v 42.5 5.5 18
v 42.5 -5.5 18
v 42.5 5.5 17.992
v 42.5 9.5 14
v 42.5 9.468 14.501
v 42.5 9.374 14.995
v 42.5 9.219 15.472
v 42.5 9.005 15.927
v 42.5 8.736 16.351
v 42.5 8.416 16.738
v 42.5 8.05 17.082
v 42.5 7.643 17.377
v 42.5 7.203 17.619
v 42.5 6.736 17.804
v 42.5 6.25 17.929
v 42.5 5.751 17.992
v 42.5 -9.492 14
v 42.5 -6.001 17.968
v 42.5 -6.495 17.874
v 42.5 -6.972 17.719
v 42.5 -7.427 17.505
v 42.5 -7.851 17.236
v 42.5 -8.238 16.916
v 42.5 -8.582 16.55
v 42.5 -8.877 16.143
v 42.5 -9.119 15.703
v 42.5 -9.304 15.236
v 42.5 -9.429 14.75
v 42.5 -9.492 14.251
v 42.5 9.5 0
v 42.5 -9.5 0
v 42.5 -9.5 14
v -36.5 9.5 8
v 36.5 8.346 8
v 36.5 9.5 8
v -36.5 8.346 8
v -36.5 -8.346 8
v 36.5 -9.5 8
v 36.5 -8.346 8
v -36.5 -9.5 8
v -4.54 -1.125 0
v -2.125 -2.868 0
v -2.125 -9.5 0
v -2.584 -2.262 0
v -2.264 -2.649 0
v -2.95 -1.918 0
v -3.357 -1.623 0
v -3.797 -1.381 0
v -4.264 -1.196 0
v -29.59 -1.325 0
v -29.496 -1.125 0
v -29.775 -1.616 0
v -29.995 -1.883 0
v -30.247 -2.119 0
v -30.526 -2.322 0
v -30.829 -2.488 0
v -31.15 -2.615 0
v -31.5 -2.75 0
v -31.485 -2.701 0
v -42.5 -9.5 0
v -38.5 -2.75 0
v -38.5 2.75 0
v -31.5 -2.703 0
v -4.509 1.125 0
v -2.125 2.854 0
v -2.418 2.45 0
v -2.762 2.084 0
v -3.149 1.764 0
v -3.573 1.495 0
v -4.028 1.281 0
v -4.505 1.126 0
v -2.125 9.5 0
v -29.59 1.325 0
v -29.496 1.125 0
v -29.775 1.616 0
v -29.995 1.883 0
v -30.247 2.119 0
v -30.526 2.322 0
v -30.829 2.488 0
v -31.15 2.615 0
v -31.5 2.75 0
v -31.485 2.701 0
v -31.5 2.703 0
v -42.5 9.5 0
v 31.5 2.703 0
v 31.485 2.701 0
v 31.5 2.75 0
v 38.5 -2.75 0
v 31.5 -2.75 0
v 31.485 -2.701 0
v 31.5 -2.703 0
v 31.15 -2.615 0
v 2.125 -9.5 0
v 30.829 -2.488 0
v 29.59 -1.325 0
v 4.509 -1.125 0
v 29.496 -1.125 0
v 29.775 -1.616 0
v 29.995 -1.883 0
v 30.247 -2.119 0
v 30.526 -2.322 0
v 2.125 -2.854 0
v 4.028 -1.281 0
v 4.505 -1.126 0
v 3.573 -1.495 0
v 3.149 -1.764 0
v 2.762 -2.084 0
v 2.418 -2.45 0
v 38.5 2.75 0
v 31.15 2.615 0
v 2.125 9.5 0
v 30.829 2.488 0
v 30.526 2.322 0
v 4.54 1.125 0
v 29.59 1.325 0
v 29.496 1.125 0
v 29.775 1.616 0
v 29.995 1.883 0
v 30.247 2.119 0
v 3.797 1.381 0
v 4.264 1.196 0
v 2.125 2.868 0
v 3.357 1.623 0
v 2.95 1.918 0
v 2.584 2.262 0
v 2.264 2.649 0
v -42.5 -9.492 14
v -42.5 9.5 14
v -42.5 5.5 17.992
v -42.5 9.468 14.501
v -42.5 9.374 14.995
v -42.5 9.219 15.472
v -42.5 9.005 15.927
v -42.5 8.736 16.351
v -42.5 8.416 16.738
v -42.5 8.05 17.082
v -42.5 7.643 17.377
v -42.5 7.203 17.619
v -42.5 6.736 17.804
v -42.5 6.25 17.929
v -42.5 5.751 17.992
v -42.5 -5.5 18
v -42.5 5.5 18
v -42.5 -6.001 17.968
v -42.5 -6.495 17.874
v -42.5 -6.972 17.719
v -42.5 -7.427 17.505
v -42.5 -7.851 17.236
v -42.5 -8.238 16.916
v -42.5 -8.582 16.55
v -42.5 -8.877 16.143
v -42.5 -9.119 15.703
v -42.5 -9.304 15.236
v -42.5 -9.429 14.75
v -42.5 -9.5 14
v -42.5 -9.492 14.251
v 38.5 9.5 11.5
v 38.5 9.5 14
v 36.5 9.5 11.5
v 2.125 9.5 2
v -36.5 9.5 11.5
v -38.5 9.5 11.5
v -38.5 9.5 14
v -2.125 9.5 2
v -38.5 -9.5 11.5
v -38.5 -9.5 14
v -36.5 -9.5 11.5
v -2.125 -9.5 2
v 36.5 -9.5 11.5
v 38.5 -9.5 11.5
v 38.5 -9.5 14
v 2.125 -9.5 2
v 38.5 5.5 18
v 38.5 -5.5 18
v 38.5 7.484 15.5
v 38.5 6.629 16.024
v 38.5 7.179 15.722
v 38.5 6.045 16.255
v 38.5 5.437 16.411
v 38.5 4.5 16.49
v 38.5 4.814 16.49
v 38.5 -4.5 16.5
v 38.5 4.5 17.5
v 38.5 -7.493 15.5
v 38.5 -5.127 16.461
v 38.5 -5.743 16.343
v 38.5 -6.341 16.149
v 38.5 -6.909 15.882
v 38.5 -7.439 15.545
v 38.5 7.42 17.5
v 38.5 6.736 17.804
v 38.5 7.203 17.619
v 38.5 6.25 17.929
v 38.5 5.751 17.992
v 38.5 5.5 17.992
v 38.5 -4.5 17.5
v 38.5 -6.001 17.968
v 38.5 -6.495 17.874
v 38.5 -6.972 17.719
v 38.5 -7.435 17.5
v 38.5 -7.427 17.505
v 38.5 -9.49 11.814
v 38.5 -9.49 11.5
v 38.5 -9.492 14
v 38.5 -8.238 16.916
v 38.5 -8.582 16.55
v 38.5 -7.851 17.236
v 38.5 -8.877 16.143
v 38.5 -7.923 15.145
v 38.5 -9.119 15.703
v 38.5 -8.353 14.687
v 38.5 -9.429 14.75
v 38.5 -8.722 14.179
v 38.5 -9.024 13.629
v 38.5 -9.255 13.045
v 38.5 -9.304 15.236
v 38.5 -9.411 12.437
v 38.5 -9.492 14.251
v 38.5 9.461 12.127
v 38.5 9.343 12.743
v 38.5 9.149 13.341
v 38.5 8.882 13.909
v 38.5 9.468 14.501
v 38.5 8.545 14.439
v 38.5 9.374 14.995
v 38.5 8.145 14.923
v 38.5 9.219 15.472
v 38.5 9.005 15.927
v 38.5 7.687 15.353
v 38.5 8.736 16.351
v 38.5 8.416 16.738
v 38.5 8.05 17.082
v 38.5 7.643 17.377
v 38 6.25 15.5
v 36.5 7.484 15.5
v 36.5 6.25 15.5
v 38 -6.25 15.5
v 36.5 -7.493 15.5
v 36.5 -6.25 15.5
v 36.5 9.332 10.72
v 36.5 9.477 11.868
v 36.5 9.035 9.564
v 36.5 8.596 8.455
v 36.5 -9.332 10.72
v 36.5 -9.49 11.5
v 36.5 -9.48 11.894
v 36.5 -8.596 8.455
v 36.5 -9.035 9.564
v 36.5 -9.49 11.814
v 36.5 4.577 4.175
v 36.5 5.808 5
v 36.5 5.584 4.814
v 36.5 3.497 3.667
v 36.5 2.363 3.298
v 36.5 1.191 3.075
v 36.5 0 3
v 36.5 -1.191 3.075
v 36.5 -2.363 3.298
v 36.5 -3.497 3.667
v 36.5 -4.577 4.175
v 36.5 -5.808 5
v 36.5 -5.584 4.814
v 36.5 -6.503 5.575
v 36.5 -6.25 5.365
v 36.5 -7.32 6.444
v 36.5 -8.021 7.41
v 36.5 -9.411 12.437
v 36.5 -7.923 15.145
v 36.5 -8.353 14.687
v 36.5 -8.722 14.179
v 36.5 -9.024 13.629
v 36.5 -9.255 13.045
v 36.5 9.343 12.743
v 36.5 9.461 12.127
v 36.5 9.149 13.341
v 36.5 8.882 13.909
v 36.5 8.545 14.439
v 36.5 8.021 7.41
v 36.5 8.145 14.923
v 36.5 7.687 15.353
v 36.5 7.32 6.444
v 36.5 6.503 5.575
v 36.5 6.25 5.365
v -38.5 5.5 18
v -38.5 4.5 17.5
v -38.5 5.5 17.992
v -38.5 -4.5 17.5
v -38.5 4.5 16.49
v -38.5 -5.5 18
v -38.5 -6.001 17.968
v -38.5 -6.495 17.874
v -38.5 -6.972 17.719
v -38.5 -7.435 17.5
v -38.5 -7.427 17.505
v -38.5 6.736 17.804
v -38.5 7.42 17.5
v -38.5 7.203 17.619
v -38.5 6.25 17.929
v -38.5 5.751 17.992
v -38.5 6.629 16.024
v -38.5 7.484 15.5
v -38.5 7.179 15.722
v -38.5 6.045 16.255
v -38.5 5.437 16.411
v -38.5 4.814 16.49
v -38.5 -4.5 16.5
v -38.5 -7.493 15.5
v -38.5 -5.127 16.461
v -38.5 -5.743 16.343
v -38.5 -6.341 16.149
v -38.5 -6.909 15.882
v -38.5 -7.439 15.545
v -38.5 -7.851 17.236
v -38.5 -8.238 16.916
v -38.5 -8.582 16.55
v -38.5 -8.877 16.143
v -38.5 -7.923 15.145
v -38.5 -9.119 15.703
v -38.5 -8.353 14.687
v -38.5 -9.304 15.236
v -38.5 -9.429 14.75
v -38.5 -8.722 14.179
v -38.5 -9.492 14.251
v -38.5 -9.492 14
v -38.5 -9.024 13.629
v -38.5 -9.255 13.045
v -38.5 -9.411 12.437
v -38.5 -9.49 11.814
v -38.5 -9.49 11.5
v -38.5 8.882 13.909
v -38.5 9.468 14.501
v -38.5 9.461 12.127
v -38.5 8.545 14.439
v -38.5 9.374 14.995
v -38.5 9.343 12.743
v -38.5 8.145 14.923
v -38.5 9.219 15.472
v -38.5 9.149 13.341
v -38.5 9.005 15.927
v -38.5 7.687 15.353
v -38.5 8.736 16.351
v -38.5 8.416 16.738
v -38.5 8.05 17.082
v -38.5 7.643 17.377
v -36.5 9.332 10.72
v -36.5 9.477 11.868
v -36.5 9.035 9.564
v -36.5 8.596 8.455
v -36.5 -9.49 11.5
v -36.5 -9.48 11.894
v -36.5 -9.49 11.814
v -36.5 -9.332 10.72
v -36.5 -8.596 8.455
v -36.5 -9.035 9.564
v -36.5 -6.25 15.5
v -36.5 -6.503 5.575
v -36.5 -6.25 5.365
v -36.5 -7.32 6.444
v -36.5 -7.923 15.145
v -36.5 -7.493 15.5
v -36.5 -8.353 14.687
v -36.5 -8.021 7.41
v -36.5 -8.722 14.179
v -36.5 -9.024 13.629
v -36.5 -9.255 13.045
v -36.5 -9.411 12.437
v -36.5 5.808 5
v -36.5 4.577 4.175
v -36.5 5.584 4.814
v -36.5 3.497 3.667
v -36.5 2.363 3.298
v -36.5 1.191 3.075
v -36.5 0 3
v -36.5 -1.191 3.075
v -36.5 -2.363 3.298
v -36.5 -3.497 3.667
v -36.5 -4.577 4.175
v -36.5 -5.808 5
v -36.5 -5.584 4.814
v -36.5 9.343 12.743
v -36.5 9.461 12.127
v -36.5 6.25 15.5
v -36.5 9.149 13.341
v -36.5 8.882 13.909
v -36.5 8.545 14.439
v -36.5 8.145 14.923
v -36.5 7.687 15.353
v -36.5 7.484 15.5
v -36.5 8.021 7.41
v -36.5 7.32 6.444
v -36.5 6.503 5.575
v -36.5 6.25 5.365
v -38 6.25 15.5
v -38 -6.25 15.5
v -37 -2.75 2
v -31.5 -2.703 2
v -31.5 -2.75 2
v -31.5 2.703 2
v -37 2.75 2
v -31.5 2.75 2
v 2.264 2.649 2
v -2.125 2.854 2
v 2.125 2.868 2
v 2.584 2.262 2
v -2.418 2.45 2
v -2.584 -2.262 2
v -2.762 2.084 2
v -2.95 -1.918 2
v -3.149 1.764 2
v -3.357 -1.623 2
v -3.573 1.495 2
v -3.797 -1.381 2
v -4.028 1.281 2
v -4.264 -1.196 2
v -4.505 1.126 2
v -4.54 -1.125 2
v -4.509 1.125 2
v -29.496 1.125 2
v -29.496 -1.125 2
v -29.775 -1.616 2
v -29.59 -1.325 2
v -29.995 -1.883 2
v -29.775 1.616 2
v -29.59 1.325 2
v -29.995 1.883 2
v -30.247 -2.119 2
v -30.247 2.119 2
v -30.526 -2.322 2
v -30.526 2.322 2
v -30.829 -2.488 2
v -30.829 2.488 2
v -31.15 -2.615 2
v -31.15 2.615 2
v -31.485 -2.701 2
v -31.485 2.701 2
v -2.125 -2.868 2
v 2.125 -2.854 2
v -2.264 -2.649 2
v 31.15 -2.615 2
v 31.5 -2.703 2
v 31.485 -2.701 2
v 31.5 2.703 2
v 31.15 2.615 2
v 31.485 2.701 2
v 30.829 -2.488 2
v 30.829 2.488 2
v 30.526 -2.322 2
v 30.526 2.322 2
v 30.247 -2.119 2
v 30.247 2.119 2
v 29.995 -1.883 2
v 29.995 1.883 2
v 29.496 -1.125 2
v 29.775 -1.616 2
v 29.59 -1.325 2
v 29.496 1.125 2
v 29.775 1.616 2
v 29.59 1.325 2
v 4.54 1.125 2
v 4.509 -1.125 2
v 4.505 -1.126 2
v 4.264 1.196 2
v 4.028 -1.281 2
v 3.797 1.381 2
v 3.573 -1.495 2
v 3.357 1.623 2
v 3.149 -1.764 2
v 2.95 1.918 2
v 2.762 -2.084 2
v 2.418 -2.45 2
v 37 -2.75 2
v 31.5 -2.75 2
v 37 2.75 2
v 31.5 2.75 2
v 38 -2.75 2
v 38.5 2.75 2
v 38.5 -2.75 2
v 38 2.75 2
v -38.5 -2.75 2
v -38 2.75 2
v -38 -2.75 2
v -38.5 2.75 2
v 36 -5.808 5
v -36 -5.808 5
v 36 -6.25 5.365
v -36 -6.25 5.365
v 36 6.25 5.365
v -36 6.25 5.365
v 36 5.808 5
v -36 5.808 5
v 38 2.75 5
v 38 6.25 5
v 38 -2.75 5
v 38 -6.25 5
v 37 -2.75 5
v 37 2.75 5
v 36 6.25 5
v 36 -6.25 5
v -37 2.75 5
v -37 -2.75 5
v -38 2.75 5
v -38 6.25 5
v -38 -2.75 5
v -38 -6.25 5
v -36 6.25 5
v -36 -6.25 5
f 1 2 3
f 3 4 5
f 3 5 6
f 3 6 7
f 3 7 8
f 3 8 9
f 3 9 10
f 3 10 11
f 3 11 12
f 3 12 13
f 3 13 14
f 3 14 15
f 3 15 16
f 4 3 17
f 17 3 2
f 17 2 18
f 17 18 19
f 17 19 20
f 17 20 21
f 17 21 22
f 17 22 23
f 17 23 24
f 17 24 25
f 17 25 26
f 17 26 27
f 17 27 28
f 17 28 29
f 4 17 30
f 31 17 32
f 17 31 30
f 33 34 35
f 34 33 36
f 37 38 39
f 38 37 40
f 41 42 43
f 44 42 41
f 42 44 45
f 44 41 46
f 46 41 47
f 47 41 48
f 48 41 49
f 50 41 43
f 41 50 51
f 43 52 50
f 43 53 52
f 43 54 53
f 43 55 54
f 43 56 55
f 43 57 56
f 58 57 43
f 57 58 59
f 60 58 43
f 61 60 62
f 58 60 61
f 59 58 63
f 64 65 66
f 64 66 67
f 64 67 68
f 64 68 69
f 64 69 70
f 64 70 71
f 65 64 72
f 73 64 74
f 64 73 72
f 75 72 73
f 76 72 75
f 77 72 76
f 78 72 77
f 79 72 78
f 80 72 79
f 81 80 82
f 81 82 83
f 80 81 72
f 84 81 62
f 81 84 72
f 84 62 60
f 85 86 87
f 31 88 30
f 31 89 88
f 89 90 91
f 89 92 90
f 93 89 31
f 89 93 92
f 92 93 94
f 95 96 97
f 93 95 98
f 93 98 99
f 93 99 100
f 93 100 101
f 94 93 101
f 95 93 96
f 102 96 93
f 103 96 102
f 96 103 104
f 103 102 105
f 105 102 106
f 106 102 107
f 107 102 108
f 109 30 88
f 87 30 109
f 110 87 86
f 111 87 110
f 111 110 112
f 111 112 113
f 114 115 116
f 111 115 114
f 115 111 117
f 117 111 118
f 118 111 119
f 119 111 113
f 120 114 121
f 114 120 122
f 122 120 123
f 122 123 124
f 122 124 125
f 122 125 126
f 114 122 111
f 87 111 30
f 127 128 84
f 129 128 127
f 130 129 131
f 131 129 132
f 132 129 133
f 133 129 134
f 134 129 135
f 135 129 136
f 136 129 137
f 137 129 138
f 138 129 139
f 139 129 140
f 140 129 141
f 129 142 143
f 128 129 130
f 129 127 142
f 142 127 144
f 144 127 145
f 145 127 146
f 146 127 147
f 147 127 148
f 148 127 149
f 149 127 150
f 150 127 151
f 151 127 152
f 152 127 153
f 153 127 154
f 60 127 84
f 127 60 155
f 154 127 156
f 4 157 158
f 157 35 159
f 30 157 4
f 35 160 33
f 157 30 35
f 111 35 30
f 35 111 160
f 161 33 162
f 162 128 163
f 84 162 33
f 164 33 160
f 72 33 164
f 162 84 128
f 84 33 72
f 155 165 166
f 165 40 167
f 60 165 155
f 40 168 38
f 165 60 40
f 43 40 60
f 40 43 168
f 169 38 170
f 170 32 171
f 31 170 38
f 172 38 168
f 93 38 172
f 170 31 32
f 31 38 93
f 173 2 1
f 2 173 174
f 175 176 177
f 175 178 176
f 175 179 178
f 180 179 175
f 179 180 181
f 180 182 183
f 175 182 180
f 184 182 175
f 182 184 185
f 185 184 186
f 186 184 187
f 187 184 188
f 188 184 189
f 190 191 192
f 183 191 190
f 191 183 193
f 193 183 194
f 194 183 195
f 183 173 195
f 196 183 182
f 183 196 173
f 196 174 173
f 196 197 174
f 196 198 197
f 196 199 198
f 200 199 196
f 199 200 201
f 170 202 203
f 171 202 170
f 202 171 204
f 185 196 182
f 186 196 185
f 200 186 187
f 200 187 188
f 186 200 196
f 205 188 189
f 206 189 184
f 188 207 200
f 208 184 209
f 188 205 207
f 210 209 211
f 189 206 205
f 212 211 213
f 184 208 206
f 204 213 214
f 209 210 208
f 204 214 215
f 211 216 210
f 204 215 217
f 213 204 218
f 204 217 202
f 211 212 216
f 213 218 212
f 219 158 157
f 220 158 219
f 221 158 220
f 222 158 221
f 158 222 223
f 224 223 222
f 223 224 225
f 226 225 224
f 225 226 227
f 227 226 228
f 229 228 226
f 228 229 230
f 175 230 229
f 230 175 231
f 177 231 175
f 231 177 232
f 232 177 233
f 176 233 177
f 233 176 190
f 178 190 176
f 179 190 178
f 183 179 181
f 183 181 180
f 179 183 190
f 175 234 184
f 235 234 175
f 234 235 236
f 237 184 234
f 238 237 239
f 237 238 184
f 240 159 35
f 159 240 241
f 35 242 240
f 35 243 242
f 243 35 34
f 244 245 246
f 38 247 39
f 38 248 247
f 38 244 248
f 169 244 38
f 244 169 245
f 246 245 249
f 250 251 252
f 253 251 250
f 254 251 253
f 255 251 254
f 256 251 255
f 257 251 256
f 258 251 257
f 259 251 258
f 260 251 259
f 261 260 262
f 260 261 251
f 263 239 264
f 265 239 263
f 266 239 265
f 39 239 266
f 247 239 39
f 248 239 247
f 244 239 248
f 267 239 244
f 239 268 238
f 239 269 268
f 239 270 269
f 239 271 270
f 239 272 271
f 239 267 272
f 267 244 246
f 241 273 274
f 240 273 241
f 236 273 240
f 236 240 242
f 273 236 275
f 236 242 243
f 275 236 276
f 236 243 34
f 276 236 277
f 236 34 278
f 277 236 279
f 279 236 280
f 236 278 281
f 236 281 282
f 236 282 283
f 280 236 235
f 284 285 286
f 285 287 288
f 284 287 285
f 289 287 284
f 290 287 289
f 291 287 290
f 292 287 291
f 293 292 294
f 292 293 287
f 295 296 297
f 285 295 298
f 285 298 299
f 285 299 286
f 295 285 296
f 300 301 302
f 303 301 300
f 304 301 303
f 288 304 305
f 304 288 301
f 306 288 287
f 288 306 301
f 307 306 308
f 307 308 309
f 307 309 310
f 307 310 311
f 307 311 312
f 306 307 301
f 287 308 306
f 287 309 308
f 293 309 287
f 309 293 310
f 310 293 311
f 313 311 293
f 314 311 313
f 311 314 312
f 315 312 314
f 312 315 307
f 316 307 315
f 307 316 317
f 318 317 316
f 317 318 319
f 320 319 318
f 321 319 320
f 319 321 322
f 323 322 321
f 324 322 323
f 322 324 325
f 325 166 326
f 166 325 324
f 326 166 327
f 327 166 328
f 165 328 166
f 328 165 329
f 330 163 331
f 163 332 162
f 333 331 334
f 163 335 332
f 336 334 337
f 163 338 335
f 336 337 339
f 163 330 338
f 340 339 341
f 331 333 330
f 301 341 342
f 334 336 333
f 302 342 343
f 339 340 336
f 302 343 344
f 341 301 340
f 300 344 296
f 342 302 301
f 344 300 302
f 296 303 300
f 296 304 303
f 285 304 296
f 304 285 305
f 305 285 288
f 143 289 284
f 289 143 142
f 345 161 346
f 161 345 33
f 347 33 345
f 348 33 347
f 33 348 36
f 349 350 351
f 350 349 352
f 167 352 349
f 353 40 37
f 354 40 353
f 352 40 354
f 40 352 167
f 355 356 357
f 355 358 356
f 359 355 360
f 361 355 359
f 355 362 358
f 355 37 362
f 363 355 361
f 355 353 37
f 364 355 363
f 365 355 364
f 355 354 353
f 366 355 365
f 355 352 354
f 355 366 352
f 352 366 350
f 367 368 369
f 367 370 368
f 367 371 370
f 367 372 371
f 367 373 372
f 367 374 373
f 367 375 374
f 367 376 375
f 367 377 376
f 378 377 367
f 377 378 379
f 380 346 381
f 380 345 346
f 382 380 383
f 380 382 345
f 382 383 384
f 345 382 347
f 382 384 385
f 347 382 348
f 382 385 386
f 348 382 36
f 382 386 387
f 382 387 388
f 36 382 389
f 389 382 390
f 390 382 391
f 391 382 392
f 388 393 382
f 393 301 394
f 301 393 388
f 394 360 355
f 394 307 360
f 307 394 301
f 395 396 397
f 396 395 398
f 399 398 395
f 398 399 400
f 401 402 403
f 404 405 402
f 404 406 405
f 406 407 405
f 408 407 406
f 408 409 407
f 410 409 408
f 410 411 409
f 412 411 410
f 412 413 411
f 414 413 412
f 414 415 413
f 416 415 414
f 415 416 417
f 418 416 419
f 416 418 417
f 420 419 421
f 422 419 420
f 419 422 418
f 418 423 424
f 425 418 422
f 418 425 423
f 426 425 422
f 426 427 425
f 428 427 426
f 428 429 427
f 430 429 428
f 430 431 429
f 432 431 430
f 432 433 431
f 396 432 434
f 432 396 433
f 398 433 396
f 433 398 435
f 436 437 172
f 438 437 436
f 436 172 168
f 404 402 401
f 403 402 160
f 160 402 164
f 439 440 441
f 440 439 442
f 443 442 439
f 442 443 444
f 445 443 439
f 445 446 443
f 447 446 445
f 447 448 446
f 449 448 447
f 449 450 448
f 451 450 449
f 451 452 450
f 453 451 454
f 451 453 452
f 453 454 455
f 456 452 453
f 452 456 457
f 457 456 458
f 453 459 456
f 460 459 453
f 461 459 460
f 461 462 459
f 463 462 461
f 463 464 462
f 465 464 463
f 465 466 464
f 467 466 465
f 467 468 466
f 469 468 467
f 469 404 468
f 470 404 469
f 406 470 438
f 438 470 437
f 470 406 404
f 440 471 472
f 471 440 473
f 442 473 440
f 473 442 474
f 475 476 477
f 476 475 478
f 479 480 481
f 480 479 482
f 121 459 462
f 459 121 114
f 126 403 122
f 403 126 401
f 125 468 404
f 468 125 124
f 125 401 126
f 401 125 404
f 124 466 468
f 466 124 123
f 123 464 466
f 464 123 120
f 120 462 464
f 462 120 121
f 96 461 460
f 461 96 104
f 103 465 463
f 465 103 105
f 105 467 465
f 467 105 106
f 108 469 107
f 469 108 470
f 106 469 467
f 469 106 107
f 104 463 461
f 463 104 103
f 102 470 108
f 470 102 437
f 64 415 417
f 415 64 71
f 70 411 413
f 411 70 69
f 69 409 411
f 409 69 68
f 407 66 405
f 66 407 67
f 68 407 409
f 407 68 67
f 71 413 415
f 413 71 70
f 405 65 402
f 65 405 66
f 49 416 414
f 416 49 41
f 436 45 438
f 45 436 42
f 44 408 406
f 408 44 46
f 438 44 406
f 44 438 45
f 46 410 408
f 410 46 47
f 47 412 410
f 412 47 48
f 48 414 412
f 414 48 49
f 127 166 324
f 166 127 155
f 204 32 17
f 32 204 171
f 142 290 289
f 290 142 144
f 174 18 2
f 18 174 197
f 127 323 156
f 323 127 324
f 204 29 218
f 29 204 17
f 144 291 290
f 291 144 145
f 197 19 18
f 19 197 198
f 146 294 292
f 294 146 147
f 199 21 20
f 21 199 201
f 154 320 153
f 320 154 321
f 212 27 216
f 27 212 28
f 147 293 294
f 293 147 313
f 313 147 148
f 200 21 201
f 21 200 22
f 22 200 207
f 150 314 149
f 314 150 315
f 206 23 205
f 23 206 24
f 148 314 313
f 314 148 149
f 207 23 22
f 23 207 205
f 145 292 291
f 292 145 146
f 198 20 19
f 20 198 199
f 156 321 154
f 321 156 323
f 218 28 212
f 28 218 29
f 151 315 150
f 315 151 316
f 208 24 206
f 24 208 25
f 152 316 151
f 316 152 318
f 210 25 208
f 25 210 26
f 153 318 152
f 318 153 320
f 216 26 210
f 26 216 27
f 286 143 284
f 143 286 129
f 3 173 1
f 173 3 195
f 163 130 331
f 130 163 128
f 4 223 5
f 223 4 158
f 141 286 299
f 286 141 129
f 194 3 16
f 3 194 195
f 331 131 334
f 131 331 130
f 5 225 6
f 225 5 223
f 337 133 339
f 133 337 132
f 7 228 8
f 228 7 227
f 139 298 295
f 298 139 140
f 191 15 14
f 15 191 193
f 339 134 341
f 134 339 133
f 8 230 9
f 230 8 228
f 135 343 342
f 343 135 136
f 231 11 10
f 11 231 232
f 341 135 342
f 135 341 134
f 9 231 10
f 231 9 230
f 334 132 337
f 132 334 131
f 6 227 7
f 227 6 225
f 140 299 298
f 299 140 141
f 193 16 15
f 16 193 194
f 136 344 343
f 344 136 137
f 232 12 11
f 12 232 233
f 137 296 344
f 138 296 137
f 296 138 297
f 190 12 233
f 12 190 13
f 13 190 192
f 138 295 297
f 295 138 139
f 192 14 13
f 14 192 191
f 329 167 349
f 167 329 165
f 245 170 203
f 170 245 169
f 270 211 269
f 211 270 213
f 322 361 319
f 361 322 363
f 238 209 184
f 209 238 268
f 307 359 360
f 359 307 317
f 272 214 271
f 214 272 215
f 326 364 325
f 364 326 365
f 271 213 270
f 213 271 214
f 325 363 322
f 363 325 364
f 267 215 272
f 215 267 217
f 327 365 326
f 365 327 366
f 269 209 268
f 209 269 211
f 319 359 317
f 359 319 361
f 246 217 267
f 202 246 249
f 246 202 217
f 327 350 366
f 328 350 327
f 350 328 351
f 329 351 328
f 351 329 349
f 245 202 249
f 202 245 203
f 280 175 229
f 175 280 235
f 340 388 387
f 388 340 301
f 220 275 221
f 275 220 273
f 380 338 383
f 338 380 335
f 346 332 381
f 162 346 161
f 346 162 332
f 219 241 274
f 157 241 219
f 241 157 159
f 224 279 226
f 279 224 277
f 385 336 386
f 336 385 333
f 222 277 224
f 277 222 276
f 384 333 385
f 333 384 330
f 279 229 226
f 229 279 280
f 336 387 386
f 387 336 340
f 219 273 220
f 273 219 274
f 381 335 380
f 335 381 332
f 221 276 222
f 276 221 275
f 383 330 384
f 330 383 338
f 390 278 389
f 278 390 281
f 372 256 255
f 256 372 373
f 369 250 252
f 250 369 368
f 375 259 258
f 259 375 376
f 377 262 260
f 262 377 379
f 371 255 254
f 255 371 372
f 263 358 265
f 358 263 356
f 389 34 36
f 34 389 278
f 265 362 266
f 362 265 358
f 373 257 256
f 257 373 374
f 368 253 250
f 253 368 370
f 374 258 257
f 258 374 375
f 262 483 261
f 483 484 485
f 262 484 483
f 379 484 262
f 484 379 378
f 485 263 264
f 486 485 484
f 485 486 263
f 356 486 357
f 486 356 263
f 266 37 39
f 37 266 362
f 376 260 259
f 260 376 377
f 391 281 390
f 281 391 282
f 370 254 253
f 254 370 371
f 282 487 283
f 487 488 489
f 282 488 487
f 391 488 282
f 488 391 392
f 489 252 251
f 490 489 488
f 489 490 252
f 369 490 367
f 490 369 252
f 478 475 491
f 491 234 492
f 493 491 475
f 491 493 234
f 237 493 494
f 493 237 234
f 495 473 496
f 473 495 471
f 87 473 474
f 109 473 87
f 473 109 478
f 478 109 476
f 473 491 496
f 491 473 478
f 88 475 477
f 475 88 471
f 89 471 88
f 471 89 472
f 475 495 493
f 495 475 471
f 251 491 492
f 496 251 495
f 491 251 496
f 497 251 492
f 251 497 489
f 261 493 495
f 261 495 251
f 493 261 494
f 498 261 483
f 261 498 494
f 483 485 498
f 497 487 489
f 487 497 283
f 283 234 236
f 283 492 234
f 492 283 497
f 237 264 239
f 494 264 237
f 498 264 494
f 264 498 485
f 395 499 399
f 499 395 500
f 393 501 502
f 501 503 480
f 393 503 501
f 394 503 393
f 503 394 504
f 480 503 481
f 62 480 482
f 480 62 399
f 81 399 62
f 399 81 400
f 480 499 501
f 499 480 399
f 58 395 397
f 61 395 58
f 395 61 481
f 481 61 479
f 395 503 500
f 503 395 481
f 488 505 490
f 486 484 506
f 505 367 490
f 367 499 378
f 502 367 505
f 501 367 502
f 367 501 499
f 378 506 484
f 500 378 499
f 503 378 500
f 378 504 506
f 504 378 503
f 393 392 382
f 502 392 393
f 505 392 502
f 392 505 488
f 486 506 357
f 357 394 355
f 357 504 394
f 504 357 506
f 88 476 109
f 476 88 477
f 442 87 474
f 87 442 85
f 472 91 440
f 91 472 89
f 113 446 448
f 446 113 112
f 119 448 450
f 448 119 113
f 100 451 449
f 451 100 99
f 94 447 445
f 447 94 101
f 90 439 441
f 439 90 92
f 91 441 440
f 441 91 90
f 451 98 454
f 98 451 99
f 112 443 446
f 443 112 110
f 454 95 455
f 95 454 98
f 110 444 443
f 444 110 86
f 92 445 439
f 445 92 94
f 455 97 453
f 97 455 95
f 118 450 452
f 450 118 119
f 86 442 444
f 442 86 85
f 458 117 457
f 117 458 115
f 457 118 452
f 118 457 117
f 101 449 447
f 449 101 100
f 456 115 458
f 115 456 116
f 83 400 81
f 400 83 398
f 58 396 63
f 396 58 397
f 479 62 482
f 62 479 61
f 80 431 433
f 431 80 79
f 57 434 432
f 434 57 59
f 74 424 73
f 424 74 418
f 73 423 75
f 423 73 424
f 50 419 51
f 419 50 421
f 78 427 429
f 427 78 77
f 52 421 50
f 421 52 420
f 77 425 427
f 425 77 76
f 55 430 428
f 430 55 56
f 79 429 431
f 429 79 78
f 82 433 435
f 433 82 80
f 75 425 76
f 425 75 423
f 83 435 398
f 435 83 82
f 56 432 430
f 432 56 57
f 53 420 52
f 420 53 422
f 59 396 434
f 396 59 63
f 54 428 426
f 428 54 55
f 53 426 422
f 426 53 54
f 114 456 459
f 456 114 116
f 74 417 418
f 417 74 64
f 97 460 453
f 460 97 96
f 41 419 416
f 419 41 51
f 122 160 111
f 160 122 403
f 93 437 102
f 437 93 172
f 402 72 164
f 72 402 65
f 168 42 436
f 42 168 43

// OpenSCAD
$fn = 50; // upgrade resolution
battery_diameter = 19;
battery_length = 73; // 69 for unprotected

difference()
{
    union()
    {
        // battery holder
        translate([0, 0, 4]) cube(size=[battery_length+8+4, battery_diameter, 8], center=true);

        // positive outside edge
        translate([(battery_length/2)+4, 0, 9]) cube(size=[4, battery_diameter, 18], center=true);

        // positive terminal holder
        translate([(battery_length/2)+1, 0, 8.75]) cube(size=[2, battery_diameter, 13.5], center=true);

        // negative outside edge
        translate([-((battery_length/2)+4), 0, 9]) cube(size=[4, battery_diameter, 18], center=true);

        // negative terminal holder
        translate([-((battery_length/2)+1), 0, 8.75]) cube(size=[2, battery_diameter, 13.5], center=true);
    }

    // battery cradle
    translate([0, 0, (battery_diameter/2)+3]) rotate(90, [0, 1, 0]) cylinder(r=battery_diameter/2, h=battery_length, center=true);

    // positive plate cutout
    translate([(battery_length+2)/2, 0, battery_diameter/2]) cube(size=[1, 5.5, 20], center=true);
    translate([(battery_length+2)/2-0.5, 0, 11]) cube(size=[2, 12.5, 12], center=true);

    // negative spring cutout
    translate([-((battery_length+2)/2), 0, battery_diameter/2]) cube(size=[1, 5.5, 20], center=true);
    translate([-((battery_length+2)/2-0.5), 0, 11]) cube(size=[2, 12.5, 12], center=true);

    // positive solder flange cutout
    translate([(battery_length/2-1.5), 0, -0.5]) cube(size=[7, 5.5, 5], center=true);
    translate([(battery_length/2)-4.5, 0, -0.5]) cylinder(r=2.75, h=5, center=true);

    // negative solder flange cutout
    translate([-(battery_length/2-1.5), 0, -0.5]) cube(size=[7, 5.5, 5], center=true);
    translate([-(battery_length/2)+4.5, 0, -0.5]) cylinder(r=2.75, h=5, center=true);

    // positive bottom cutout for wires
    translate([30/2, 0, -0.75]) cube(size=[30, 2.25, 5.5], center=true);
    translate([3/2, 1, -0.75]) edge(4, 5.5);
    translate([3/2, -1, -0.75]) rotate(-90, [0, 0, 1]) edge(4, 5.5);

    // negative bottom cutout for wires
    translate([-30/2, 0, -0.75]) cube(size=[30, 2.25, 5.5], center=true);
    translate([-3/2, 1, -0.75]) rotate(90, [0, 0, 1]) edge(4, 5.5);
    translate([-3/2, -1, -0.75]) rotate(180, [0, 0, 1]) edge(4, 5.5);

    // joining bottom cutout for wires
    translate([0, 0, -0.75]) cube(size=[4.25, battery_diameter+5, 5.5], center=true);

    // rounded corners on end plates
    translate([0, -battery_diameter/2, 18]) rotate(90, [0, 1, 0]) edge(4, battery_length+13);
    translate([0, battery_diameter/2, 18]) rotate(90, [0, 1, 0]) rotate(-90, [0, 0, 1]) edge(4, battery_length+13);
    translate([0, -battery_diameter/2, 16.5]) rotate(90, [0, 1, 0]) edge(5, battery_length+4);
    translate([0, battery_diameter/2, 16.5]) rotate(90, [0, 1, 0]) rotate(-90, [0, 0, 1]) edge(5, battery_length+4);
}

module edge(radius, height)
{
	difference()
	{
		translate([radius/2-0.5, radius/2-0.5, 0]) cube([radius+1, radius+1, height], center = true);
		translate([radius, radius, 0]) cylinder(h = height+1, r1 = radius, r2 = radius, center = true);
	}
}
